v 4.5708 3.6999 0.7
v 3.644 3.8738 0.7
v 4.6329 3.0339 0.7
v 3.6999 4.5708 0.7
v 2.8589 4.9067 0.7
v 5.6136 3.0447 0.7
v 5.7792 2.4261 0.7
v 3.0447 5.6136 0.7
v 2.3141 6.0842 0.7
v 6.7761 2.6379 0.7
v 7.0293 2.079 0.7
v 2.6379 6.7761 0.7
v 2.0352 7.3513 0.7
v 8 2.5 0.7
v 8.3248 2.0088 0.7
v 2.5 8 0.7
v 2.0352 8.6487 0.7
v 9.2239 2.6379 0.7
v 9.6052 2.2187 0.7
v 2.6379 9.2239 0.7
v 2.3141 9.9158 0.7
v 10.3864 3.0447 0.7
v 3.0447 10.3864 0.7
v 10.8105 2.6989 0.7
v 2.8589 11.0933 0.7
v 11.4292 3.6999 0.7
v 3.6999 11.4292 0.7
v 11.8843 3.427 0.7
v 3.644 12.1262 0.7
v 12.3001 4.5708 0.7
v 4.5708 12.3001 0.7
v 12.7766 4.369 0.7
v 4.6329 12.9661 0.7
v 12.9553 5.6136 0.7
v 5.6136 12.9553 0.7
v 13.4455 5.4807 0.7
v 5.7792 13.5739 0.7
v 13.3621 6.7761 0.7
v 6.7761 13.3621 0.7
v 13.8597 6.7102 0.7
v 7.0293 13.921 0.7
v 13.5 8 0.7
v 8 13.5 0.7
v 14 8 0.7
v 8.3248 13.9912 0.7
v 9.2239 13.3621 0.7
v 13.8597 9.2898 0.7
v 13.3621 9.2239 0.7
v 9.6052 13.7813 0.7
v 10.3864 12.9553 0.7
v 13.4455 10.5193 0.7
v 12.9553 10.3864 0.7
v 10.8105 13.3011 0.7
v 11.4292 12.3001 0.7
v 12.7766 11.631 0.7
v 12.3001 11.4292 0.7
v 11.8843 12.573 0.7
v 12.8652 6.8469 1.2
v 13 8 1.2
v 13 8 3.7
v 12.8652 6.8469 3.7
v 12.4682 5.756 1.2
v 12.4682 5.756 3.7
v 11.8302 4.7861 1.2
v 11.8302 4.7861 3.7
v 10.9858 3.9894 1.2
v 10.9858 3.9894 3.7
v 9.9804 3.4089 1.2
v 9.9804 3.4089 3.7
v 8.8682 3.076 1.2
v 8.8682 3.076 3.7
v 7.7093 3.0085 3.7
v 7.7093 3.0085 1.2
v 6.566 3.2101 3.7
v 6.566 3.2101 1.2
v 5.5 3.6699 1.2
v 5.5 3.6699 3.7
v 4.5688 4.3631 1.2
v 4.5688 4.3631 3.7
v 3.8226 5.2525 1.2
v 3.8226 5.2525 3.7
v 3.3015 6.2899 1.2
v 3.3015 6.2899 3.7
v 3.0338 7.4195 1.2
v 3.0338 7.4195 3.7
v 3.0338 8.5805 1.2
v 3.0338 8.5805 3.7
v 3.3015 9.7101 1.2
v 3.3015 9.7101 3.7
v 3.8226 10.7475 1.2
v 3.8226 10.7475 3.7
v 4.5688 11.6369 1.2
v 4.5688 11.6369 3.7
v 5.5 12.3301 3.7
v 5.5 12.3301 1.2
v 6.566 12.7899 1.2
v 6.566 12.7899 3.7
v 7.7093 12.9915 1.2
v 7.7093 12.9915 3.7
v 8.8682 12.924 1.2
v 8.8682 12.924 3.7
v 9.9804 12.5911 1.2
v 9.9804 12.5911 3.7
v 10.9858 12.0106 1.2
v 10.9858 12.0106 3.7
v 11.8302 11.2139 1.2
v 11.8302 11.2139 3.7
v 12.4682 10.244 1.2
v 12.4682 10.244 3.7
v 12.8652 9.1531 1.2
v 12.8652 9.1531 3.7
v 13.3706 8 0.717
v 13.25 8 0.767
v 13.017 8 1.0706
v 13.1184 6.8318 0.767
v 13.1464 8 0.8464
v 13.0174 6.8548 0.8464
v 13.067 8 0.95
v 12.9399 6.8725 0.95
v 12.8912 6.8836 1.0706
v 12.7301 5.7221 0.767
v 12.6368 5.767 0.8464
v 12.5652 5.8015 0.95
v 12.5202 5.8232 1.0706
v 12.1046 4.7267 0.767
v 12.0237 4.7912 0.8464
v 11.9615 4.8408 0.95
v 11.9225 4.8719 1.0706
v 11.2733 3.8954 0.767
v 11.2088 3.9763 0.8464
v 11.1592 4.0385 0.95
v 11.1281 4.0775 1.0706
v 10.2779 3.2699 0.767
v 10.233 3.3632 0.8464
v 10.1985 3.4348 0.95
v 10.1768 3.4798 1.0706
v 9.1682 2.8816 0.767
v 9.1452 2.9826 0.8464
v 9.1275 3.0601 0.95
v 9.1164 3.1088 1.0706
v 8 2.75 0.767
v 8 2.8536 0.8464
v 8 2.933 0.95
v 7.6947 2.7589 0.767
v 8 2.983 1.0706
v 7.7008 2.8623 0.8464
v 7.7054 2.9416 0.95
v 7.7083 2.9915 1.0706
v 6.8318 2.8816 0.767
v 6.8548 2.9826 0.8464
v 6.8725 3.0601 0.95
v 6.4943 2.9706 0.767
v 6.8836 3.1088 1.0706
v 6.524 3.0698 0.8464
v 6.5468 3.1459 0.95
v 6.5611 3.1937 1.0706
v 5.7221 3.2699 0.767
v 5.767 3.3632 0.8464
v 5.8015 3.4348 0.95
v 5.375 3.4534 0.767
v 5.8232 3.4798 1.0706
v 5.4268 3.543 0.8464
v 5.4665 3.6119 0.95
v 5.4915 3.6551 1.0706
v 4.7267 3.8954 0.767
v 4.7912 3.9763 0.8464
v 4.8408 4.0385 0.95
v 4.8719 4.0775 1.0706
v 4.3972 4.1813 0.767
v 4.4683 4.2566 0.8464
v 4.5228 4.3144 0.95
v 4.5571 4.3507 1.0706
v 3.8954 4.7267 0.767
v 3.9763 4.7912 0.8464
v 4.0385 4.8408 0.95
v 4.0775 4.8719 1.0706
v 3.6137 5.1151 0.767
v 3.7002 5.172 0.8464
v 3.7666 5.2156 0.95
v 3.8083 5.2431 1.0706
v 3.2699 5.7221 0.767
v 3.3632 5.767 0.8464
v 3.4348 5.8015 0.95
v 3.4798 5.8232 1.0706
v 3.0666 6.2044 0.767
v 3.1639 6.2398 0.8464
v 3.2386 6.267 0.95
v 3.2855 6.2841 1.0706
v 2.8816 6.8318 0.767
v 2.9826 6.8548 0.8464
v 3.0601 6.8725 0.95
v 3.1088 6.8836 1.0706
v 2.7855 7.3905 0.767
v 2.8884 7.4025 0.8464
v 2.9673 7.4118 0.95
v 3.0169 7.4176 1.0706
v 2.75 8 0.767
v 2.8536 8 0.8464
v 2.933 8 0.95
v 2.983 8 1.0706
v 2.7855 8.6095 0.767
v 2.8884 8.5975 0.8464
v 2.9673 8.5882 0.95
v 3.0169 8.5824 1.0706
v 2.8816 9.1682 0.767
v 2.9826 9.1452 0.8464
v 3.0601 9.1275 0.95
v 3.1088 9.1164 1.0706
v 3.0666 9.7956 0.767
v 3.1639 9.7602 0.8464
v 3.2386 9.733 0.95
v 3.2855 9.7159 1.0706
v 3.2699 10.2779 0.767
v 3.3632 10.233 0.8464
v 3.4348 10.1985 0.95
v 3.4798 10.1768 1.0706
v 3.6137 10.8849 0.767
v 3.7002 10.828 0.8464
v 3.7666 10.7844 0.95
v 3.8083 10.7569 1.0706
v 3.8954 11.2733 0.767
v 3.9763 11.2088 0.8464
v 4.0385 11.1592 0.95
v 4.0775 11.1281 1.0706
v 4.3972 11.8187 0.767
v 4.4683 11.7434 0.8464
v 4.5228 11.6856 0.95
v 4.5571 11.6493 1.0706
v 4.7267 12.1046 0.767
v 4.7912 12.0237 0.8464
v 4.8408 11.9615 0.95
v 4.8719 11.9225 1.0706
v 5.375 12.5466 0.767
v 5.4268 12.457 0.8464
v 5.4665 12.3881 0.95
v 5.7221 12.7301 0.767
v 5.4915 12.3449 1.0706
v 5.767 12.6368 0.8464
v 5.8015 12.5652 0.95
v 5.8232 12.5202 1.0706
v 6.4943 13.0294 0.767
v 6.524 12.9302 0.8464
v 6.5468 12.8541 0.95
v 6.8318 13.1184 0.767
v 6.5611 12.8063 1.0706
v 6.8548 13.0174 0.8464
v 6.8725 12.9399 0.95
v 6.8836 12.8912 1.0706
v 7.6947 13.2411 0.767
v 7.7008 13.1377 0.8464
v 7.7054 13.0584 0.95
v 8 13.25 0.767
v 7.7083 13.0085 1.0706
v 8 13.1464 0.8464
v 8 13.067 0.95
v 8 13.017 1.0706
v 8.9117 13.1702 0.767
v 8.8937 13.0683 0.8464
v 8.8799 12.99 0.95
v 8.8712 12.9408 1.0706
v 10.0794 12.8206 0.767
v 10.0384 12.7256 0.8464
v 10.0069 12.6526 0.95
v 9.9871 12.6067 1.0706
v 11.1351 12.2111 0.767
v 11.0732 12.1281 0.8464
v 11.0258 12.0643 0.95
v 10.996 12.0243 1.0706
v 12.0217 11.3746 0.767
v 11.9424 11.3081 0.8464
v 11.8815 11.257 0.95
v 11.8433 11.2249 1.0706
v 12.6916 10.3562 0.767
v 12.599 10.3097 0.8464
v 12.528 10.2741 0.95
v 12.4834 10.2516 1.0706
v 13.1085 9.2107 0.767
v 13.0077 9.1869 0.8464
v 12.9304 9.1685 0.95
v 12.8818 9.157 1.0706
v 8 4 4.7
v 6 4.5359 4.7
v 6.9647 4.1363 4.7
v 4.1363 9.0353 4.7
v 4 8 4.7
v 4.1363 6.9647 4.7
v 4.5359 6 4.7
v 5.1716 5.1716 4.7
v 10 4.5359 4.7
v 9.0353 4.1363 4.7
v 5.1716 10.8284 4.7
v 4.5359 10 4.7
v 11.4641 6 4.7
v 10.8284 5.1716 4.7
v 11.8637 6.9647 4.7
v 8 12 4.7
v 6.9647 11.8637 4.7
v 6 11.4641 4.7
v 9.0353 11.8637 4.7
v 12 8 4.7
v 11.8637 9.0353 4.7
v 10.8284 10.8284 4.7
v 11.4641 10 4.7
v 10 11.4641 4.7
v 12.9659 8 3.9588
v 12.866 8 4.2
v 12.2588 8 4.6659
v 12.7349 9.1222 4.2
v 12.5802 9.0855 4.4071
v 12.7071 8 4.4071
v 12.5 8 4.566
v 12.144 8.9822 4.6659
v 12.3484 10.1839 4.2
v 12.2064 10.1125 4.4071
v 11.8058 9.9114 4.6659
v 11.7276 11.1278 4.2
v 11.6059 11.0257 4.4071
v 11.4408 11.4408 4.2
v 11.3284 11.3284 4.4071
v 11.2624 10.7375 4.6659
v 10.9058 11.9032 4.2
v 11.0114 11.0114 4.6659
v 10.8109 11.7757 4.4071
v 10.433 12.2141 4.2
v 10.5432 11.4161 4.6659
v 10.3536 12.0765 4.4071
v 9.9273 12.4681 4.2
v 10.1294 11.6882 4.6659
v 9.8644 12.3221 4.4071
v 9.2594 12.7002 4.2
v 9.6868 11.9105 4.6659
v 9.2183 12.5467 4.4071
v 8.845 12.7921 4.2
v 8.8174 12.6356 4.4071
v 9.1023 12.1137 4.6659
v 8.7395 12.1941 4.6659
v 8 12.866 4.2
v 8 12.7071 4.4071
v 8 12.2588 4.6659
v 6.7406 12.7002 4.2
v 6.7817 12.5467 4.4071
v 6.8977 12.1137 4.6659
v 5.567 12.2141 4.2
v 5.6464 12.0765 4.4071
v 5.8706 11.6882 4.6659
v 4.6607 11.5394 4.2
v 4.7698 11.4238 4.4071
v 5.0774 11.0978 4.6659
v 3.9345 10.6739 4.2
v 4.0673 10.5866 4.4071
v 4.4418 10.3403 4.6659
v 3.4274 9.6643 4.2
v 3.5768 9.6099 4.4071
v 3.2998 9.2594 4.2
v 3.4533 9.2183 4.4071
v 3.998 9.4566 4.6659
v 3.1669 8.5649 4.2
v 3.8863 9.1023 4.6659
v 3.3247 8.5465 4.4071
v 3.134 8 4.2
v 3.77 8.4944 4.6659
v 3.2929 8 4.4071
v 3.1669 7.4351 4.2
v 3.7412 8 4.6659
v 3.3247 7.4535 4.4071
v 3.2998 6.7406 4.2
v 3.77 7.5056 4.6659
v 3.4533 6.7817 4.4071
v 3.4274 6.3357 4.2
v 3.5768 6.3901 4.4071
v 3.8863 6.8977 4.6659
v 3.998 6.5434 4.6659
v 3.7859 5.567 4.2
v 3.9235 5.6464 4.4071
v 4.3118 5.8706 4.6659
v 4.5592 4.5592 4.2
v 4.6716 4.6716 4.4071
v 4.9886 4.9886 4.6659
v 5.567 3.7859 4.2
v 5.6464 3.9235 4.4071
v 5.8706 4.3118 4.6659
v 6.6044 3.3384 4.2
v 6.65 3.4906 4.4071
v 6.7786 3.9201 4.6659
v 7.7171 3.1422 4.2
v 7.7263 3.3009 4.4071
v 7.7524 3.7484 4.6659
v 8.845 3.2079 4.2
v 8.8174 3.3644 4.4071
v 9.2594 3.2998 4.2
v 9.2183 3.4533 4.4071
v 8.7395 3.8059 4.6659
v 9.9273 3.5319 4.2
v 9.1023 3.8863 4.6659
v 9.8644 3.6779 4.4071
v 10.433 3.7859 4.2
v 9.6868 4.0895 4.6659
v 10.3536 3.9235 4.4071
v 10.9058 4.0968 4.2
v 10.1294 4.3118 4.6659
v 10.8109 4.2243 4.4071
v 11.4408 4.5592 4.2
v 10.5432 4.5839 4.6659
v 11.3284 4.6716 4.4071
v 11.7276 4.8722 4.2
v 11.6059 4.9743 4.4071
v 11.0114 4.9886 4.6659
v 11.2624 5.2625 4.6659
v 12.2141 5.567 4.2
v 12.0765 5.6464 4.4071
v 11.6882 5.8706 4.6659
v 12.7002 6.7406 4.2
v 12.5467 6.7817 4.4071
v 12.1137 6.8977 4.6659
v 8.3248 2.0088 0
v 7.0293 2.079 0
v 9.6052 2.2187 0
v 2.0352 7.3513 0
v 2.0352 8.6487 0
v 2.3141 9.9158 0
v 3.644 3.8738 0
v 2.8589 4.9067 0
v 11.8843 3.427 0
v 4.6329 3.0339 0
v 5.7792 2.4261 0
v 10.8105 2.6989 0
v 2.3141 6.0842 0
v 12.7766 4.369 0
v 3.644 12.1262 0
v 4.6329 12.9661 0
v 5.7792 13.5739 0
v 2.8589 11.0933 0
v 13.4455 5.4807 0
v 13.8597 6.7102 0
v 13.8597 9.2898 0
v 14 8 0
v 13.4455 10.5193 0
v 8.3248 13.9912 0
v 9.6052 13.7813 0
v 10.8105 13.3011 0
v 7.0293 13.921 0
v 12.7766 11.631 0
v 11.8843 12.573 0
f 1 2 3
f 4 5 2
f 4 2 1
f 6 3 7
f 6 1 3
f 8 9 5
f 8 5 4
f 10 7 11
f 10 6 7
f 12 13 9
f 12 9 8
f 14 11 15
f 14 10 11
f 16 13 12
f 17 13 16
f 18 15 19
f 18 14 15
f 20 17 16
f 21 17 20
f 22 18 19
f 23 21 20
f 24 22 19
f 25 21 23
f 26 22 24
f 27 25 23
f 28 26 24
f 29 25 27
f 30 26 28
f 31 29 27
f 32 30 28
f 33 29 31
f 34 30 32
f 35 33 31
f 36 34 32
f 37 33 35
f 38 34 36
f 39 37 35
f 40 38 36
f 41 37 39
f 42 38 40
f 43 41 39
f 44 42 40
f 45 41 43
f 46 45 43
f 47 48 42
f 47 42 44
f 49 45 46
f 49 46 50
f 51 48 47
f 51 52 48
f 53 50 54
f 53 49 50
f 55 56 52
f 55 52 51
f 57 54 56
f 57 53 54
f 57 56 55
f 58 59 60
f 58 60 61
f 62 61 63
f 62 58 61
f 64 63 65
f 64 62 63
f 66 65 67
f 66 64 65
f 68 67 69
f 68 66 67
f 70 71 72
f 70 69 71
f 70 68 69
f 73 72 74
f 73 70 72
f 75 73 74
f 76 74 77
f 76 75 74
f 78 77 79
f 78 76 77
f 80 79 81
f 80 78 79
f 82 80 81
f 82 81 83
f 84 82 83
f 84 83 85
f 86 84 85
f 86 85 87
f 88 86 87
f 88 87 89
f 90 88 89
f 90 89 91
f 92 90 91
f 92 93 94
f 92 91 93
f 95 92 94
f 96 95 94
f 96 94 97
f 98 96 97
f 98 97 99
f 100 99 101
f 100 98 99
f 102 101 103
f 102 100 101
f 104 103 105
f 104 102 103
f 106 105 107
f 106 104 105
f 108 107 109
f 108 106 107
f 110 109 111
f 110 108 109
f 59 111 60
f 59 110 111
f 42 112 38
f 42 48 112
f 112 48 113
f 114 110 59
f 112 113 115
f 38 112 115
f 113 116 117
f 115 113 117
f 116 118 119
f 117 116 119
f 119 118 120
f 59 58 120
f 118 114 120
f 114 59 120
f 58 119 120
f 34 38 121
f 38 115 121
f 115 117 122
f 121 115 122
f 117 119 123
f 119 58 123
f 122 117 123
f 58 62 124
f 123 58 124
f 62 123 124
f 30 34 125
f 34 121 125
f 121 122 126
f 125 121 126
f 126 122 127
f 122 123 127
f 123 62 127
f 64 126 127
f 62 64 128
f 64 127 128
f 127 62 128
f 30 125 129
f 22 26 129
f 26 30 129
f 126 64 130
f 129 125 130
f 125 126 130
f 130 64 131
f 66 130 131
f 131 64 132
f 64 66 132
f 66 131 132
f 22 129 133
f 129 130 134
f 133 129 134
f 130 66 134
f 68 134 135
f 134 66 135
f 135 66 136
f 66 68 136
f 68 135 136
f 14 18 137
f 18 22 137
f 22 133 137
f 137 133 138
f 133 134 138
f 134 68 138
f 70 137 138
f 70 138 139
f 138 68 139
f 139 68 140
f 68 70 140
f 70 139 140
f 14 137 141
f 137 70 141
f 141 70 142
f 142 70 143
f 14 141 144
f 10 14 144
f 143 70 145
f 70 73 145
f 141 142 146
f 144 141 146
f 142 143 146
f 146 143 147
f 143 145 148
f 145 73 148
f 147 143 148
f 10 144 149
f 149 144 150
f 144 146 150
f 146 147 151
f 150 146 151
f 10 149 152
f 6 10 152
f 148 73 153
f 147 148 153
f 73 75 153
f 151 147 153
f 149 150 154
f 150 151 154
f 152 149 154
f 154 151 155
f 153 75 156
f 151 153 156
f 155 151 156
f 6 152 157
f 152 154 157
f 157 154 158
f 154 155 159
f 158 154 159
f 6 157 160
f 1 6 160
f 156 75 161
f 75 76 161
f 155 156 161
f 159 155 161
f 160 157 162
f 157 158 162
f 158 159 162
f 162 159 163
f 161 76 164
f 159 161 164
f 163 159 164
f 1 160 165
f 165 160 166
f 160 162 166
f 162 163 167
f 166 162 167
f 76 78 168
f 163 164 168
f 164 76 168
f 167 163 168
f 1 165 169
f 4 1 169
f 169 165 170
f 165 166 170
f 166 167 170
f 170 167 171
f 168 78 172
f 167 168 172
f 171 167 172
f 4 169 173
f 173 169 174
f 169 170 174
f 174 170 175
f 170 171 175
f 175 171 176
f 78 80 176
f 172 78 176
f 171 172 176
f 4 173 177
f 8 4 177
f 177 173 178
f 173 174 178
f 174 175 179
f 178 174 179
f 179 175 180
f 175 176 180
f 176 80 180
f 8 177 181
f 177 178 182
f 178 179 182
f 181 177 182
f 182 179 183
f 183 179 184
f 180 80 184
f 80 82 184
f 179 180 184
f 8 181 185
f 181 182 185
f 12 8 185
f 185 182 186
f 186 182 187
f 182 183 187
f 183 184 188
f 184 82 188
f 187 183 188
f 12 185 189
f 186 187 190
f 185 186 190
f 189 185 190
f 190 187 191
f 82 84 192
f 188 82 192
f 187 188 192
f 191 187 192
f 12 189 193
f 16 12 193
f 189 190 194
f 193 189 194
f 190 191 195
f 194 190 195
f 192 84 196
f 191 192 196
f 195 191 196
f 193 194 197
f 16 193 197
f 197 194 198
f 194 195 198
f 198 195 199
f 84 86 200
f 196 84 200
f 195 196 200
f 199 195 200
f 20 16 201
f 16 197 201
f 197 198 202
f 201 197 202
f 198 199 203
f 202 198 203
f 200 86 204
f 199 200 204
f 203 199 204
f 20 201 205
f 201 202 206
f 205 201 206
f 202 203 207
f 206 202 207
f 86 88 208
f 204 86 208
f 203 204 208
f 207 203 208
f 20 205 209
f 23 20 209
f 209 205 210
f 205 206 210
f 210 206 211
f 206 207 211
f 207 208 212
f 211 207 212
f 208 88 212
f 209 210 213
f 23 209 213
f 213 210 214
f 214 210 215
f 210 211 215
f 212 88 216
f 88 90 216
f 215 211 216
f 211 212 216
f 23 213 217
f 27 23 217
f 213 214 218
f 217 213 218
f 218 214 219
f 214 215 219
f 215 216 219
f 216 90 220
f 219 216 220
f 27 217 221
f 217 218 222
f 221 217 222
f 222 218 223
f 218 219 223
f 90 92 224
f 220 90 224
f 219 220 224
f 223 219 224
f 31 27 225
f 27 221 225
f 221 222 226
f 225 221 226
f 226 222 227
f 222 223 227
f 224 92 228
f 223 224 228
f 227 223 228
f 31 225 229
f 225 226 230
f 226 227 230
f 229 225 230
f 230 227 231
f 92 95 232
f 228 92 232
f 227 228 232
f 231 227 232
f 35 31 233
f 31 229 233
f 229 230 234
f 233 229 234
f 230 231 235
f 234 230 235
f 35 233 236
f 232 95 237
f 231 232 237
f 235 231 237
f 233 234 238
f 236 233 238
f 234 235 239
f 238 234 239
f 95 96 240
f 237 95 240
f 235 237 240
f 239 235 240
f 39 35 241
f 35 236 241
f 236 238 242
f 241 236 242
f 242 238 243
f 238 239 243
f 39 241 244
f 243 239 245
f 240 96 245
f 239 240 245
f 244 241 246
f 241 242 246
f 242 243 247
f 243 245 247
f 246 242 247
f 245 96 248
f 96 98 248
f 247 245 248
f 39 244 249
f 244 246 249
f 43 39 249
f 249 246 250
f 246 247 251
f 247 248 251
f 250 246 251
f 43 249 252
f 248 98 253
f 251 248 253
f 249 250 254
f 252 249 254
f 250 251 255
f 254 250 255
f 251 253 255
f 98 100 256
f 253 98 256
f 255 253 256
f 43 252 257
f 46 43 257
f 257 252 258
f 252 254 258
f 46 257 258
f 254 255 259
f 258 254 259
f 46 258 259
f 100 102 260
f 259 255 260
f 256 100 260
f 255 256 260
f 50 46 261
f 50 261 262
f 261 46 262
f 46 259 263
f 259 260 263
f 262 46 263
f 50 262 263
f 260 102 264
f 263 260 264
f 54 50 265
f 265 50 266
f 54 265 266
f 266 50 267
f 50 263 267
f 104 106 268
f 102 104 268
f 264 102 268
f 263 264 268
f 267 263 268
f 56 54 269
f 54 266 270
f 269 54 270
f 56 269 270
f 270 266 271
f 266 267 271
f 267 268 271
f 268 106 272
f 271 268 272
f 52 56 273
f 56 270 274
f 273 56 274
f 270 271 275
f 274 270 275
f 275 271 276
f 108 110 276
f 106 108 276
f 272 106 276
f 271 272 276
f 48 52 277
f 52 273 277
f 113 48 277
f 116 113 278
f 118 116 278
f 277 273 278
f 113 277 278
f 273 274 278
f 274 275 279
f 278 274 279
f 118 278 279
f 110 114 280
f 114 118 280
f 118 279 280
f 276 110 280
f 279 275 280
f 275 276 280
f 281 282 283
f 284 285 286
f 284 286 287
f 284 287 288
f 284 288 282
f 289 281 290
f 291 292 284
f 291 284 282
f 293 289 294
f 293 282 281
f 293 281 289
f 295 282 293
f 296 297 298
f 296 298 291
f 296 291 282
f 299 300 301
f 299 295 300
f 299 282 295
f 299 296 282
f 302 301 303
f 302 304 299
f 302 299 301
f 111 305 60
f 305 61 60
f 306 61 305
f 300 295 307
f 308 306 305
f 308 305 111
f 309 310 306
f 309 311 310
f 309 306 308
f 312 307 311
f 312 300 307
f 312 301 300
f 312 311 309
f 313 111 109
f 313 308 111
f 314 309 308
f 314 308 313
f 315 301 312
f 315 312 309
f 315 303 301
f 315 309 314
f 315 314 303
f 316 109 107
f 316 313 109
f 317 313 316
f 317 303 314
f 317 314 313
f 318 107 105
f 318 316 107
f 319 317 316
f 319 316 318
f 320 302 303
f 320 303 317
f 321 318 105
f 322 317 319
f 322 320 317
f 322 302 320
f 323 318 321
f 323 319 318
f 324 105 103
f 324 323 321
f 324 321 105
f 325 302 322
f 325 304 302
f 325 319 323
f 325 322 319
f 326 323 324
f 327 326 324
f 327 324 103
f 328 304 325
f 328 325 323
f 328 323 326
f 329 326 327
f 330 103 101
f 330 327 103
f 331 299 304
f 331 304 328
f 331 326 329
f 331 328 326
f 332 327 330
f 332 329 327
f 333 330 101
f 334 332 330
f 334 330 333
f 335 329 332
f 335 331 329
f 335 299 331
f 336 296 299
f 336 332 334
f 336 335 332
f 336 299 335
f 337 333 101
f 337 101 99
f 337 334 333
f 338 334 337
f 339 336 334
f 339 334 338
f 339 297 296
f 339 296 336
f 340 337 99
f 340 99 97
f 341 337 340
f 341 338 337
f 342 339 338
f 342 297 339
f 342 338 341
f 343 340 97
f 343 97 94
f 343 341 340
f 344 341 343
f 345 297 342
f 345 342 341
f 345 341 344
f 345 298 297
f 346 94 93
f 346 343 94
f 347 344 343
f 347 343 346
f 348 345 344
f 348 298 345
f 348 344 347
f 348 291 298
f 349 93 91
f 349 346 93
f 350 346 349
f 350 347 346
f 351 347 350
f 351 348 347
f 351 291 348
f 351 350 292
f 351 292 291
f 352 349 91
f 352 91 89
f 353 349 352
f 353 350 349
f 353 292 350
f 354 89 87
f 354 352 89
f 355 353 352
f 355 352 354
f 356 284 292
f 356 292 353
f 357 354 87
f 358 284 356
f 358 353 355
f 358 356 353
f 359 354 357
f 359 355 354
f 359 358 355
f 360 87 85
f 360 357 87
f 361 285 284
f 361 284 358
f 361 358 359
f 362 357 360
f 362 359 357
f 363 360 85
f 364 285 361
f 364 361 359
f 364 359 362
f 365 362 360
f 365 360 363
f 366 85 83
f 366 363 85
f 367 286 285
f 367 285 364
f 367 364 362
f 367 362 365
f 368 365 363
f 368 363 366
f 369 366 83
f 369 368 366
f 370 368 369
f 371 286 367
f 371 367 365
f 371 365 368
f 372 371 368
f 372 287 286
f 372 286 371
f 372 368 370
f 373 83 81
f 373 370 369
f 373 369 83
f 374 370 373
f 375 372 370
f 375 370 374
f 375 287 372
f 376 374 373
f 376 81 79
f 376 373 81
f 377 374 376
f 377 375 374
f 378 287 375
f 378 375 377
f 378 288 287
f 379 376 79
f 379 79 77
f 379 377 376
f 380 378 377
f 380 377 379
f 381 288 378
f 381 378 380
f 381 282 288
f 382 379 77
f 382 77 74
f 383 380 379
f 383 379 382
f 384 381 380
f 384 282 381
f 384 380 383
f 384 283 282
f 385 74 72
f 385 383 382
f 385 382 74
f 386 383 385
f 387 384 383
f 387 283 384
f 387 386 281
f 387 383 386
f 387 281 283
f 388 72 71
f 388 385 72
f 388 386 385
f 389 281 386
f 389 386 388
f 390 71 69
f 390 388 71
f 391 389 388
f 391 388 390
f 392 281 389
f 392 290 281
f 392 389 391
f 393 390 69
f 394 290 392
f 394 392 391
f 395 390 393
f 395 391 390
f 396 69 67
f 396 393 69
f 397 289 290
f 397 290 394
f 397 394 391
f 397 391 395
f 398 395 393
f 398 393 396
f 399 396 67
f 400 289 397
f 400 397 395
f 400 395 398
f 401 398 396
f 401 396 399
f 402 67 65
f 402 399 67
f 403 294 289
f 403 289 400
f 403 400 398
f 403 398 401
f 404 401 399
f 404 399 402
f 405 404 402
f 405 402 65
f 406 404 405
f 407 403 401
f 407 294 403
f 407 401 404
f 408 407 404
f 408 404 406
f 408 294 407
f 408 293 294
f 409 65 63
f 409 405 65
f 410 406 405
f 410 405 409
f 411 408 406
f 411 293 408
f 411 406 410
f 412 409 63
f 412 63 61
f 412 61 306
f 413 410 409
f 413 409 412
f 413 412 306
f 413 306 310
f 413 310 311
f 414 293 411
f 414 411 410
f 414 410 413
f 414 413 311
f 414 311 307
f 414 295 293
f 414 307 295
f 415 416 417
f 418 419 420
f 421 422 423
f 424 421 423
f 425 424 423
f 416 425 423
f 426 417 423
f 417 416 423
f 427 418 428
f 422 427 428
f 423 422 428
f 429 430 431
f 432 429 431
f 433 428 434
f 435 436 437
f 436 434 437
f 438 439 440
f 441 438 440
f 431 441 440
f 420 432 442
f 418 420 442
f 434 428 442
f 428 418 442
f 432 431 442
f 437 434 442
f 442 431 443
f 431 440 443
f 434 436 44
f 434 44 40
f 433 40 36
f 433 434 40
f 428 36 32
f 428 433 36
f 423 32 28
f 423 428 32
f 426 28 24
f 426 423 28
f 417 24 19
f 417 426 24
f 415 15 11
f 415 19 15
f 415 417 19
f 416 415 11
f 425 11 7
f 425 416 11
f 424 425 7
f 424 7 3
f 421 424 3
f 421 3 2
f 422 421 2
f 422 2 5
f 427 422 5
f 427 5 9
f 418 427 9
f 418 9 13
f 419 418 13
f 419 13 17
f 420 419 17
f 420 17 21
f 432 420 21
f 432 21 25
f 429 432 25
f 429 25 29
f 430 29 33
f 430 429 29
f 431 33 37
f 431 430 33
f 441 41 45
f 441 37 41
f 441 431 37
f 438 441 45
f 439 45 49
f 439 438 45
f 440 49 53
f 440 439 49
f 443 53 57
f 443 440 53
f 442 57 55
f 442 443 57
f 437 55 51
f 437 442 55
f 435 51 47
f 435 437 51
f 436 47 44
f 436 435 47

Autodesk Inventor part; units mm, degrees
ref_plane "YZ Plane" through (0, 0, 0) normal (1, 0, 0) x (0, 1, 0)
ref_plane "XZ Plane" through (0, 0, 0) normal (0, 1, 0) x (-1, 0, 0)
ref_plane "XY Plane" through (0, 0, 0) normal (0, 0, 1) x (1, 0, 0)
sketch "Sketch1" plane through (0, 0, 0) normal (0, 0, 1) x (1, 0, 0)
  line L0 (0, 0) -> (16, 0)
  line L1 (16, 0) -> (16, 16)
  line L2 (16, 16) -> (0, 16)
  line L3 (0, 16) -> (0, 0)
  circle A0 centre (8, 8) radius 6
  dimension "d0" = 16
  dimension "d1" = 8
  dimension "d2" = 8
  dimension "d3" = 12
extrude "Extrusion2" add sketch "Sketch1" along normal blind 0.7 contours A0
sketch "Sketch3" plane through (8, 8, 0.7) normal (0, 0, 1) x (1, 0, 0)
  circle A0 centre (0, 0) radius 5
  circle A1 centre (0, 0) radius 6 projected
  point P0 (-8, -8)
  dimension "d10" = 10
extrude "Extrusion3" add sketch "Sketch3" along normal blind 4 contours A0
fillet "Fillet1" radius 1 1 edges at (3, 8, 4.7)
fillet "Fillet1" radius 0.5 1 edges at (3, 8, 0.7)
properties part number "Foot"
